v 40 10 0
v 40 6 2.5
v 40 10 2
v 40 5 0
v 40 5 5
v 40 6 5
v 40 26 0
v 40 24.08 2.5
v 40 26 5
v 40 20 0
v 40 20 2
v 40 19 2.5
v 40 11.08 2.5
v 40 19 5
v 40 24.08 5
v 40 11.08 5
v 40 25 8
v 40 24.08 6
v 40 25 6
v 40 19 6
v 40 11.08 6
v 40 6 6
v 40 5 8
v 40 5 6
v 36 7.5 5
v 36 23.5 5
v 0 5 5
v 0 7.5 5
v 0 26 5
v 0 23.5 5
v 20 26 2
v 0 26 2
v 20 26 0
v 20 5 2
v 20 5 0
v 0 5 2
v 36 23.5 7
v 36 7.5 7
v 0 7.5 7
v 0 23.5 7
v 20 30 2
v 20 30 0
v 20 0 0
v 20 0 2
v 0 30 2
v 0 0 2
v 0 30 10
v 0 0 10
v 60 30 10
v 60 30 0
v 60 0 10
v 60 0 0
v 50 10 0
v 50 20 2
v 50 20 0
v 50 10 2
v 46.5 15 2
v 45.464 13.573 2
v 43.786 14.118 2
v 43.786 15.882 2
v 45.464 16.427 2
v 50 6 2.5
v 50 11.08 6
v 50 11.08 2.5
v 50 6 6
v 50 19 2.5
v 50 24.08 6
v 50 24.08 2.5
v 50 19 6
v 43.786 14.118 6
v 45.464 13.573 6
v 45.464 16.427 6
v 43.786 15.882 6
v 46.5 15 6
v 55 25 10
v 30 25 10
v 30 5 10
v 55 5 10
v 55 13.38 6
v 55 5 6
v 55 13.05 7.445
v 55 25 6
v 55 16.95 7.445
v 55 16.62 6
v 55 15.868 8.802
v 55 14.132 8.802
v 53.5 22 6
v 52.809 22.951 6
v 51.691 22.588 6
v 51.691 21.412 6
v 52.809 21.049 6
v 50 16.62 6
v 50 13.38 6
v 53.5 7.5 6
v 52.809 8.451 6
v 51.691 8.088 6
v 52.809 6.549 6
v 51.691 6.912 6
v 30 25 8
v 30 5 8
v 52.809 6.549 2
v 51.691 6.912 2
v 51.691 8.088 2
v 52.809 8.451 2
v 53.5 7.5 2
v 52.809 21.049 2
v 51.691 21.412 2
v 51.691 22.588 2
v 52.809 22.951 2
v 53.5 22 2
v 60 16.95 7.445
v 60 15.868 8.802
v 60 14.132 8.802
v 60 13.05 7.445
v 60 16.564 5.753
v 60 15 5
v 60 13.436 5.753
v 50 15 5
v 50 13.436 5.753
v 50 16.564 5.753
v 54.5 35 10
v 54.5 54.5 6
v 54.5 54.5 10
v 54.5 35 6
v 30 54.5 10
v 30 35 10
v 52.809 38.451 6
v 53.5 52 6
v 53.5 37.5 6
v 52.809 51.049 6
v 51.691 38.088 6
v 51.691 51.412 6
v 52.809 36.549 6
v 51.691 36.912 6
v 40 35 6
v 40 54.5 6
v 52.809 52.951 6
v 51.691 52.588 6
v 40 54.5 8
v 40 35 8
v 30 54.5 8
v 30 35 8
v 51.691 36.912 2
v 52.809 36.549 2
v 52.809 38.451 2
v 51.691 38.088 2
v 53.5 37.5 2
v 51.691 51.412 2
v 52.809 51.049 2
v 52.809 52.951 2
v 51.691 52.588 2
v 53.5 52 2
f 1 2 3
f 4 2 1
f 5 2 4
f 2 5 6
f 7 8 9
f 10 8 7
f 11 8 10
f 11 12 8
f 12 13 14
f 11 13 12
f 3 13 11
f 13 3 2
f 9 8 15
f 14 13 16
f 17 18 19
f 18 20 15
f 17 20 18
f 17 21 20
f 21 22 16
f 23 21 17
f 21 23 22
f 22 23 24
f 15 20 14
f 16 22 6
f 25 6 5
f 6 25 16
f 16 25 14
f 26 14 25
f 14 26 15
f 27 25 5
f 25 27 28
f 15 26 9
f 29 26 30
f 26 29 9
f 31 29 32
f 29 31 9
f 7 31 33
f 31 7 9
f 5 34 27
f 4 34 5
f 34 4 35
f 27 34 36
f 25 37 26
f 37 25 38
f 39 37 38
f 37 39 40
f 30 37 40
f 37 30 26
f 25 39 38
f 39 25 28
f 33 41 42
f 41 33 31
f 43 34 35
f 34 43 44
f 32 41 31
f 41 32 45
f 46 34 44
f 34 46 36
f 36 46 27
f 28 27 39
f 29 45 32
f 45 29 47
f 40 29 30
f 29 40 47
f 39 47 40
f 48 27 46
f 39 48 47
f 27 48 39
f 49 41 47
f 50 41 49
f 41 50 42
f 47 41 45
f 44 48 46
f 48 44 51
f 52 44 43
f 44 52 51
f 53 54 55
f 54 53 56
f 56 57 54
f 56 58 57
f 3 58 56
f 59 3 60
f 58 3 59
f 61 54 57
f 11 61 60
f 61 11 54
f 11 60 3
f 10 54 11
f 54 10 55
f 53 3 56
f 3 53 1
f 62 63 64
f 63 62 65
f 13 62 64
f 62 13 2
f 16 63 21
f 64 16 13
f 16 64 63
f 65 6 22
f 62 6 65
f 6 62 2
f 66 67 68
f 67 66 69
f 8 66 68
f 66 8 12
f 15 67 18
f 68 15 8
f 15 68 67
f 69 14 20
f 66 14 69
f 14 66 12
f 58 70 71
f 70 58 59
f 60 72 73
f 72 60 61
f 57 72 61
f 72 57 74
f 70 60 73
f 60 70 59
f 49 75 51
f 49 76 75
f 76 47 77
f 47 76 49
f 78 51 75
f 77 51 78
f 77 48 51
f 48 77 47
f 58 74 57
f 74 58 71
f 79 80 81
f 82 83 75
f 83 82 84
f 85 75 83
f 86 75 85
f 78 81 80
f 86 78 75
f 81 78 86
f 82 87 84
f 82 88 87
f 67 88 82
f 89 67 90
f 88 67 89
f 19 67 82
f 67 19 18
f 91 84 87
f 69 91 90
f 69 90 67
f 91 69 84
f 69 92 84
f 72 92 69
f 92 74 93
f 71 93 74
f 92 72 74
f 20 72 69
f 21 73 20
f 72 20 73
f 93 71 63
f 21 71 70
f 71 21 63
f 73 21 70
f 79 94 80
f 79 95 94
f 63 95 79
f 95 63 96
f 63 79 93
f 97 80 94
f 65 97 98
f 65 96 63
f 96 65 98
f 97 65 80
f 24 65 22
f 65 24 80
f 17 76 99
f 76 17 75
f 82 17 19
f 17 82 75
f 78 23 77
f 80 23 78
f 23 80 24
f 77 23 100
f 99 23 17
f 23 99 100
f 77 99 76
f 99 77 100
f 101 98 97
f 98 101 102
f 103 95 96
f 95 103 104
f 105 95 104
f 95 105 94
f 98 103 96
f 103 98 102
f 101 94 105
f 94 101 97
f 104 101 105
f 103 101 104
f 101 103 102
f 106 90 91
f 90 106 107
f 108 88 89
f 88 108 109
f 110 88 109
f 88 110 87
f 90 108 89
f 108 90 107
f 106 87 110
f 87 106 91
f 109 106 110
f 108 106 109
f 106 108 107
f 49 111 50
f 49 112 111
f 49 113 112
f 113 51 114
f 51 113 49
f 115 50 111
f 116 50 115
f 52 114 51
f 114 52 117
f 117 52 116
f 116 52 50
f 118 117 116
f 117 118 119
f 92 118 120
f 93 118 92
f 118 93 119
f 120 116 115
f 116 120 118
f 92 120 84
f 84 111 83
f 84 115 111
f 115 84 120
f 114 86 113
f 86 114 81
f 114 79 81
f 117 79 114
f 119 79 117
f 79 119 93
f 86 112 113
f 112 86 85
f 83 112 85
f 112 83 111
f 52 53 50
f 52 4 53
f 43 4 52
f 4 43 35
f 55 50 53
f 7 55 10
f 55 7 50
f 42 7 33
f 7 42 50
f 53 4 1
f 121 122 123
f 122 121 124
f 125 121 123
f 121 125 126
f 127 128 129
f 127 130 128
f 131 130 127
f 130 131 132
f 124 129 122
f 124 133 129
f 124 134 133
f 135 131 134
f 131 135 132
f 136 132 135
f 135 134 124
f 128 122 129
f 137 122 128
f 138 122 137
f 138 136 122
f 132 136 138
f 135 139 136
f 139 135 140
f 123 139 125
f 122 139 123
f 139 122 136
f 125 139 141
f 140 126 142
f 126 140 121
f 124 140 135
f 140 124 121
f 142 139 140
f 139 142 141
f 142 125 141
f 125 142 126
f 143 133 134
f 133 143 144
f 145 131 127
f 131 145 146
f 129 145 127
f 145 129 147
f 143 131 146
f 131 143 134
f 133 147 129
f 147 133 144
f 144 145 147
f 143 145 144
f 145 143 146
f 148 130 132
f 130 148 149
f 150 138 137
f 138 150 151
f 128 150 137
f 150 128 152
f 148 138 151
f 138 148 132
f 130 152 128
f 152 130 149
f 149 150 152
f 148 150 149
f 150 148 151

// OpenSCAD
module singleTabDock()
{
	intersection() {
		difference() {
			union() {
				cube([60, 30, 10]);
				//translate([0, 0, -5])
				//	cube([15, 15, 10]);

			}
			union() {
				// Main front top cutout - Part A - Outer
                       translate([-10,5,-5]) 
				  cube([50, 21, 10]);
				// Main front top cutout - Part B - Inner
                       translate([-10,7.5,-5]) 
				  cube([46, 16, 12]);

				// Decorational cutout
                       translate([0,0,-3]) 
				  cube([20, 30, 5]);

				// Tab cutout
                       translate([-10,10,-5]) 
				  cube([60, 10, 7]);

				// Connector slot
                       translate([40,6,2.5]) 
				  cube([10, 2.54*2, 8]);
                       translate([40,19,2.5]) 
				  cube([10, 2.54*2, 8]);

				// Main Screw hole
                       translate([45,15,0]) 
				  cylinder(r = 1.5, h = 10);

				// Wiring Cavity
                       translate([40,5,6]) 
				  cube([15, 20, 4]);

				// Additional cutout for mounting backplate
                       translate([30,5,8]) 
				  cube([15, 20, 2]);

				// Backplate Screw hole 1
                       translate([52.50,7.5,2]) 
				  cylinder(r = 1, h = 8);

				// Backplate Screw hole 2
                       translate([52.50,22,2]) 
				  cylinder(r = 1, h = 8);

 				// Rear wire Hole
                       	translate([50,15,7]) 
					rotate([0,90,0])
						cylinder(r=2, h= 10);

			}
		}
              
	//	translate([0, 0, 25])
	//		cylinder(h = 51, r1 = 20, r2 = 5, center = true);
//                 cube([60, 30, 30], center = true);



	}
}

module backPlate(){

				// Wiring Cavity
                       translate([40,35,6]) 
				  cube([15 - 0.5, 20 - 0.5, 4]);

				// Additional cutout for mounting backplate
                       translate([30,35,8]) 
				  cube([14.5, 19.5, 2]);

				// Backplate Screw hole 1
                       translate([52.50,37.5,2]) 
				  cylinder(r = 1, h = 8);

				// Backplate Screw hole 2
                       translate([52.50,52,2]) 
				  cylinder(r = 1, h = 8);


}

singleTabDock();

backPlate();
